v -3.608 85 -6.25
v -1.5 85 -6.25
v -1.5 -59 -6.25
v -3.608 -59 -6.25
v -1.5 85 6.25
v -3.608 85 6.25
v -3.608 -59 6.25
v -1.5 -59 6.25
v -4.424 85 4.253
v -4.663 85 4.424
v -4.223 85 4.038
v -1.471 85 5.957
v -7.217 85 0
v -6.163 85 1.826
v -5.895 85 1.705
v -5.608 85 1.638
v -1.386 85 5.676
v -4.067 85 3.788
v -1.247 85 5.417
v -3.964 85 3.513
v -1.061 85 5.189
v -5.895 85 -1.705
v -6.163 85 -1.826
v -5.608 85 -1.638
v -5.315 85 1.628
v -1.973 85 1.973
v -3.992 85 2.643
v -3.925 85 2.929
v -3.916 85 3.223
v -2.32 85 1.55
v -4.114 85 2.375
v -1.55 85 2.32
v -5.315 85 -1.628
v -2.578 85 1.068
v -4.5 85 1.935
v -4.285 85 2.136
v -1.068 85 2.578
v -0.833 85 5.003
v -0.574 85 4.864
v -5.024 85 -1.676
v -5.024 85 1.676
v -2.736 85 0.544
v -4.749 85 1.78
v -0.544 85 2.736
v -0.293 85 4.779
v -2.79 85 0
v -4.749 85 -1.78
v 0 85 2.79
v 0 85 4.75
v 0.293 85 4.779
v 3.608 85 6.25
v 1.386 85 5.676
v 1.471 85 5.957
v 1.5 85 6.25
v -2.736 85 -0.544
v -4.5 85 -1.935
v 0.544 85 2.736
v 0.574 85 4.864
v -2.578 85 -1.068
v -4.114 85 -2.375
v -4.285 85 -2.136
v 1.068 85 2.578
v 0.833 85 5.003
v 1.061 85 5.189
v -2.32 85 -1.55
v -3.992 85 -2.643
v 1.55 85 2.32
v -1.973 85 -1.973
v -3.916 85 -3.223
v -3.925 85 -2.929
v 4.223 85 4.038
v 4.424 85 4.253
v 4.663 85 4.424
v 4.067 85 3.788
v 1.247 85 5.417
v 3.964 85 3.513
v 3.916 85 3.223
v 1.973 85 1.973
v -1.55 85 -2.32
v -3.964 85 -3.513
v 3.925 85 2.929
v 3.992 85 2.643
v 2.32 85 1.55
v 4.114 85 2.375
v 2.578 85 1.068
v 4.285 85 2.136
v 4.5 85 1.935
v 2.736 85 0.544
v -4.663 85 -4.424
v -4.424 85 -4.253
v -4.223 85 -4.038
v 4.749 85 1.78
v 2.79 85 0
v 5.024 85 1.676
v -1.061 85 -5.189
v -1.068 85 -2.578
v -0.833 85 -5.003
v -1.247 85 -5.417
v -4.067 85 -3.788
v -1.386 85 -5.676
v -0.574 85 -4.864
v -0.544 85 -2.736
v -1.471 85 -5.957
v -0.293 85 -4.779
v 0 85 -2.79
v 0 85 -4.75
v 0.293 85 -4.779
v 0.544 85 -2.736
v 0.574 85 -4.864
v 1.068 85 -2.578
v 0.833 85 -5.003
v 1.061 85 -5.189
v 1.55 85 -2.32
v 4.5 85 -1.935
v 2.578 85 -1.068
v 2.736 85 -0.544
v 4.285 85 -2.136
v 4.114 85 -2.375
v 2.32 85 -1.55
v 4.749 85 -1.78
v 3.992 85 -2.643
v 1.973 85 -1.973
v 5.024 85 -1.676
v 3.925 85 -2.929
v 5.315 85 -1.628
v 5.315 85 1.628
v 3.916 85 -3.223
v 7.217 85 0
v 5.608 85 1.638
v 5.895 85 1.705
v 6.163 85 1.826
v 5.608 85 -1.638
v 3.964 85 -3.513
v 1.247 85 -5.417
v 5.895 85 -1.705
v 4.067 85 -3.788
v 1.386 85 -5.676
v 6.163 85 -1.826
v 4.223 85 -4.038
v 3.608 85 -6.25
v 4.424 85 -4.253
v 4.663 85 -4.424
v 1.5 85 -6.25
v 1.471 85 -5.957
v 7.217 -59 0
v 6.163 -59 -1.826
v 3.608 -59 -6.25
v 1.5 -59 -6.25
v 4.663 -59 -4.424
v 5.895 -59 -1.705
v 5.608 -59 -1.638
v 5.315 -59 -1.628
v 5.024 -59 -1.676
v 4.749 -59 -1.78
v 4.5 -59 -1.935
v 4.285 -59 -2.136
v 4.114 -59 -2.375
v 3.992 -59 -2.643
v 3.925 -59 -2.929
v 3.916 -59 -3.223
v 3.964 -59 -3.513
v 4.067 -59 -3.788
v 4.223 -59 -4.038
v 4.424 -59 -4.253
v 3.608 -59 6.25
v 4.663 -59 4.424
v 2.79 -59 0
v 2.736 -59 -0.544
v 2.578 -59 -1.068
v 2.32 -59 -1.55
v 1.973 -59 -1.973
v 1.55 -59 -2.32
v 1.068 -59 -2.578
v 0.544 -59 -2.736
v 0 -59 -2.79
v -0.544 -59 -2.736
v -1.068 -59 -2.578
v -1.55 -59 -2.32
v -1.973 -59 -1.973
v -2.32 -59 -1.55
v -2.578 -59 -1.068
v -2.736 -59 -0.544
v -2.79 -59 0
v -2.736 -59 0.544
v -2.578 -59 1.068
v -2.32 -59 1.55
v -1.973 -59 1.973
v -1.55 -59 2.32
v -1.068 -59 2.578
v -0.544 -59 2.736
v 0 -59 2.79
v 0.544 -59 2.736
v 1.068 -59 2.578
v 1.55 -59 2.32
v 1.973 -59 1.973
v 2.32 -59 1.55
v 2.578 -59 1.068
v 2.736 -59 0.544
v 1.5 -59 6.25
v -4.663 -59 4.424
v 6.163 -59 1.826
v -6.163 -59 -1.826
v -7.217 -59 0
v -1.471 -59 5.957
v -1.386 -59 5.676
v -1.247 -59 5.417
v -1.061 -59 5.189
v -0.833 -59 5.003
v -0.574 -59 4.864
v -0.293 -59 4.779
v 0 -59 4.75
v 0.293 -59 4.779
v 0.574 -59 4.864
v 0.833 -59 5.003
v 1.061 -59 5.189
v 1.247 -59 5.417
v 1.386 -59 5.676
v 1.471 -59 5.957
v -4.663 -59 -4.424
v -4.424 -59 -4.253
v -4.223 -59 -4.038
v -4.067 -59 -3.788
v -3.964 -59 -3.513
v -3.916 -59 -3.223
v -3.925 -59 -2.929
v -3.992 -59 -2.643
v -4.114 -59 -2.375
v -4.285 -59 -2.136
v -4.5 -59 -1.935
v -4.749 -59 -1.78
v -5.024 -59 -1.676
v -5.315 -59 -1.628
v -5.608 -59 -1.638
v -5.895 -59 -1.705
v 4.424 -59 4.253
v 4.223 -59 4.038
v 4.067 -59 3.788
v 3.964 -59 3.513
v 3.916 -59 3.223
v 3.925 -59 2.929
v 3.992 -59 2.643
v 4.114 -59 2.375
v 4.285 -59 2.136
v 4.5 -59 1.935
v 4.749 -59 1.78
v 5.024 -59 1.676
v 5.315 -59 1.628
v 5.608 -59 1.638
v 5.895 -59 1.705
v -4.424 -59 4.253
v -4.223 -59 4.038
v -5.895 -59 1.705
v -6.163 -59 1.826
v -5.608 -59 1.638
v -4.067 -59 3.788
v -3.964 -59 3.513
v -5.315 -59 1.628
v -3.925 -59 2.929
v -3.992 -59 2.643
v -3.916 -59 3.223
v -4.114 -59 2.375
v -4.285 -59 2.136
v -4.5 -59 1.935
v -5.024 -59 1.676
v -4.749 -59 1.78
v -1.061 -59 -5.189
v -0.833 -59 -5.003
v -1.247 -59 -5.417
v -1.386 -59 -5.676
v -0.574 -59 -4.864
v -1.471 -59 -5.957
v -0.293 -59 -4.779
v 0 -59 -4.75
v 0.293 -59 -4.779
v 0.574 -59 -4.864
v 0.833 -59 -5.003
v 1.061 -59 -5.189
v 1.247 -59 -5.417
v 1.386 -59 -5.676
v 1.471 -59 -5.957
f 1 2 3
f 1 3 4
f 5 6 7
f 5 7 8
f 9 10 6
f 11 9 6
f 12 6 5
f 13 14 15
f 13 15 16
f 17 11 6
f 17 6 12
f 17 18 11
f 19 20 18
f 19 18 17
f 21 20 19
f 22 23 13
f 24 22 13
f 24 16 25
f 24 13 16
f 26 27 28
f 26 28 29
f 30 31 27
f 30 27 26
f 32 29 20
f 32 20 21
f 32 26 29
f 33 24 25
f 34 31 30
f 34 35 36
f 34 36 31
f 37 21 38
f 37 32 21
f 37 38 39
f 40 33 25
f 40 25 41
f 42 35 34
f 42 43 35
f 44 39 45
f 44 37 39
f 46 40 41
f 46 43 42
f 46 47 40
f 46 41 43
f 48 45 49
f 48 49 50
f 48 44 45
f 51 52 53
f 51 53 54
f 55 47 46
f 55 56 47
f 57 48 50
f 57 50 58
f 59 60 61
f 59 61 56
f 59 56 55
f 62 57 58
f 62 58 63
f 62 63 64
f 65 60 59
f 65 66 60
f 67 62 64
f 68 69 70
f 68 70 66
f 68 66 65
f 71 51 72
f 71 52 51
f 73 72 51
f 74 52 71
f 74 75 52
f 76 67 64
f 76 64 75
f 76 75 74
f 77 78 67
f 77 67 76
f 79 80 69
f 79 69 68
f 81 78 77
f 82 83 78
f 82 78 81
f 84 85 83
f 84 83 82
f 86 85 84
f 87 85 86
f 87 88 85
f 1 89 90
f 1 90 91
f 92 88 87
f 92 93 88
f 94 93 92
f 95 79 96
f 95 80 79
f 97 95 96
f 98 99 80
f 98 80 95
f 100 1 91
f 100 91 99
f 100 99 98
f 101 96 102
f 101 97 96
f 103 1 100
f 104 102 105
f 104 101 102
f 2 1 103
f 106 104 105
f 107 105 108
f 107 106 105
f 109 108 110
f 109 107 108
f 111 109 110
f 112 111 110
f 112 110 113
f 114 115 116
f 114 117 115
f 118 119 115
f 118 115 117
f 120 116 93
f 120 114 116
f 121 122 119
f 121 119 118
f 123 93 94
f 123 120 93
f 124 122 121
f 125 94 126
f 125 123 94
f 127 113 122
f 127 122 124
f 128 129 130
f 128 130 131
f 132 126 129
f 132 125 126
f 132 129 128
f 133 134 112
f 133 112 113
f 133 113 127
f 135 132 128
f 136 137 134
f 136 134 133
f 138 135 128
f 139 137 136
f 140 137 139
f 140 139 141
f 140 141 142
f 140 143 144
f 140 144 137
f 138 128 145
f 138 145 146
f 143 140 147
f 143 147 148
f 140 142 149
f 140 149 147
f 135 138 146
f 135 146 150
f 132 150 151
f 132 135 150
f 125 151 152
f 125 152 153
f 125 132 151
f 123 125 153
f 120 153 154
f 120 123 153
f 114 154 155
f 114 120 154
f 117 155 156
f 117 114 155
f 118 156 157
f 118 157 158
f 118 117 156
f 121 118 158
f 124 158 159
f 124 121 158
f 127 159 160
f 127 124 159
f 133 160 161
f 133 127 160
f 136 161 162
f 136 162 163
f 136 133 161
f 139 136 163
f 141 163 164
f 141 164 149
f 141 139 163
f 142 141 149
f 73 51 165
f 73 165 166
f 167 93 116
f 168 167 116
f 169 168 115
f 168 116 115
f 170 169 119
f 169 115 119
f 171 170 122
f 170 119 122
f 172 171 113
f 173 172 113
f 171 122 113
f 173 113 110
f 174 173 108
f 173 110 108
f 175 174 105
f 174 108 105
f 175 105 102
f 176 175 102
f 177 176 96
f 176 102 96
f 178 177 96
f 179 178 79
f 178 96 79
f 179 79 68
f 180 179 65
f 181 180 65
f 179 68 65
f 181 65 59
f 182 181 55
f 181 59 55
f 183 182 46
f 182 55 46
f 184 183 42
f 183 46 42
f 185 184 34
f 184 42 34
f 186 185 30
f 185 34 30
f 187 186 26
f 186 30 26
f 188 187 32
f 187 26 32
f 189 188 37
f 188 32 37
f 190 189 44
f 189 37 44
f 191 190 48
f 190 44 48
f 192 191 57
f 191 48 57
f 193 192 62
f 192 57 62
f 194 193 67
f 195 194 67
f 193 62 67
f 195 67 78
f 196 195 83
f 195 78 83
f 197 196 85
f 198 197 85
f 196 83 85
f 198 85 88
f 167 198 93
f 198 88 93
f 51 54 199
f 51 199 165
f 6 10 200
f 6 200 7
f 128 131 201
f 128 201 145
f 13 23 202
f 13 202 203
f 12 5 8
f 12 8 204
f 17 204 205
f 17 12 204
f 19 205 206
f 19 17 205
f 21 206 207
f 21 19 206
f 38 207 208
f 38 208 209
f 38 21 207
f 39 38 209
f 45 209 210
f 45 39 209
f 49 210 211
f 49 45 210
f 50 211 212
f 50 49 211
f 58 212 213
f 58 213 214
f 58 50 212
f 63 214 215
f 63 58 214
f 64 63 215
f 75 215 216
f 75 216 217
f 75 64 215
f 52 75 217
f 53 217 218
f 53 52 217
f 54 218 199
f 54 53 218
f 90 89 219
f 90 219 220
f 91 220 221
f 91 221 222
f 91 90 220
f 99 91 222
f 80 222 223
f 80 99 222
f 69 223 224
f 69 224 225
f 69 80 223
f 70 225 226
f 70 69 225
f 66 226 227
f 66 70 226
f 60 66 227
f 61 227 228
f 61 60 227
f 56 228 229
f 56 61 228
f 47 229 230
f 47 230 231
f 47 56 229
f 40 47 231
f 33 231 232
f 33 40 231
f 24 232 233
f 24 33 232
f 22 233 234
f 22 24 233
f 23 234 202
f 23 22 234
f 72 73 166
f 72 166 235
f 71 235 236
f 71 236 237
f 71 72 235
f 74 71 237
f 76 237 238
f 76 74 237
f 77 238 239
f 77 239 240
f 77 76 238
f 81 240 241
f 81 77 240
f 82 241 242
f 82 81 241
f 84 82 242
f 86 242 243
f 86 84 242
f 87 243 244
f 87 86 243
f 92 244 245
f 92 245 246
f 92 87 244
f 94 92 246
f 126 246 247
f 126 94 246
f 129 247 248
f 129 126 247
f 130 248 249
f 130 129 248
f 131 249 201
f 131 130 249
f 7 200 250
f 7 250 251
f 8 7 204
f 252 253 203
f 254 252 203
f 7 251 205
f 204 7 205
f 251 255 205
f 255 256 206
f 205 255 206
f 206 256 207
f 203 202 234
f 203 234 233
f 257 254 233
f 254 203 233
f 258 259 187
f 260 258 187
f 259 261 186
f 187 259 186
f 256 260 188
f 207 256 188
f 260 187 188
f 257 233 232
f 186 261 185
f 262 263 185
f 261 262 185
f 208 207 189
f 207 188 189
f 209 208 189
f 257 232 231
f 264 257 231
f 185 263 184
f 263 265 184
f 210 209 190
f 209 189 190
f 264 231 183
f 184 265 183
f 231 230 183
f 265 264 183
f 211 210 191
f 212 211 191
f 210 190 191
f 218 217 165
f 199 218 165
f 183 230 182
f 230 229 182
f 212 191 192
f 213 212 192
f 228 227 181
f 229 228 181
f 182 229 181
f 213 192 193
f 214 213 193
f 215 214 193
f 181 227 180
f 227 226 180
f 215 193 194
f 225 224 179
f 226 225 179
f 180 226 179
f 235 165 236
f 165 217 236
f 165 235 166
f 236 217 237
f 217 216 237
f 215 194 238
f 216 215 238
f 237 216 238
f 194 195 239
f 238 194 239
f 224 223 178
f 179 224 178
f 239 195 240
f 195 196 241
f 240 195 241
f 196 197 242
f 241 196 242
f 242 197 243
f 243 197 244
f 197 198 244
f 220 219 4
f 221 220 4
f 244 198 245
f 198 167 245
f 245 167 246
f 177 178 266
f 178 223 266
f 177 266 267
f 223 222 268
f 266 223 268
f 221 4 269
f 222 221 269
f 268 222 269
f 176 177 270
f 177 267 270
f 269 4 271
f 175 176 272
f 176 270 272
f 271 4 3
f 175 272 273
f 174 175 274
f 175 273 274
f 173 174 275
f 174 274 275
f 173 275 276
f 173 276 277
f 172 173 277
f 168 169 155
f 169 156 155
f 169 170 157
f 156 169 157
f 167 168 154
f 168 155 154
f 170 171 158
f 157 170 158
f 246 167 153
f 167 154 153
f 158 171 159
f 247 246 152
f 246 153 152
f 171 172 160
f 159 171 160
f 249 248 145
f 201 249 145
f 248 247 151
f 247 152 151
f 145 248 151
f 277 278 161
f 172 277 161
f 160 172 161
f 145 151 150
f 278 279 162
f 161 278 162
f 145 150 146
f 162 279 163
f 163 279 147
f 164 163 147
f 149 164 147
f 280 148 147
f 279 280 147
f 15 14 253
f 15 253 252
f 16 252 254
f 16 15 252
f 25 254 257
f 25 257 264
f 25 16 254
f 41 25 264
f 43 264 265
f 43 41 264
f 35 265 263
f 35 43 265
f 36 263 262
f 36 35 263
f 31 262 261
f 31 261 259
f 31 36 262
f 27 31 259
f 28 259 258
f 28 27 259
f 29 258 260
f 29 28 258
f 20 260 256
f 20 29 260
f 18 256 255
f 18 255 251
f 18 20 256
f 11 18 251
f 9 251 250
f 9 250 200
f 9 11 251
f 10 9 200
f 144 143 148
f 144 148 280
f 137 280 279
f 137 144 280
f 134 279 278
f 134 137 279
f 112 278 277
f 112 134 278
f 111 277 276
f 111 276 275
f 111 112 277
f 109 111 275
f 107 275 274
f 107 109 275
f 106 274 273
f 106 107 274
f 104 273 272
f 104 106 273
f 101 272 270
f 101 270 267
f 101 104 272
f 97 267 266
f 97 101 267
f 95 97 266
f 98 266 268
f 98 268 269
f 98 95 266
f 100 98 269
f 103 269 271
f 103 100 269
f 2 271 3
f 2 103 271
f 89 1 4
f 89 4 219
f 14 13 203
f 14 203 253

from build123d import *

# Parameters (mm, degrees)
ESBO_O1_R                = 2.79
RESSALTO_EXTRUS_O1_DEPTH = 144


with BuildPart() as part:
    # Esboço1 → Ressalto-extrusão1 (new body)
    with BuildSketch(Plane(origin=(0, 85, 0), x_dir=(1, 0, 0), z_dir=(0, 1, 0))):
        with BuildLine():
            Line((6.162658774, -1.825961894), (7.216878365, 0))
            Line((7.216878365, 0), (6.162658774, 1.825961894))
            ThreePointArc((6.162658774, 1.825961894), (4.113620668, 2.375), (4.662658774, 4.424038106))
            Line((4.662658774, 4.424038106), (3.608439182, 6.25))
            Line((3.608439182, 6.25), (1.5, 6.25))
            ThreePointArc((1.5, 6.25), (0, 4.75), (-1.5, 6.25))
            Line((-1.5, 6.25), (-3.608439182, 6.25))
            Line((-3.608439182, 6.25), (-4.662658774, 4.424038106))
            ThreePointArc((-4.662658774, 4.424038106), (-4.113620668, 2.375), (-6.162658774, 1.825961894))
            Line((-6.162658774, 1.825961894), (-7.216878365, 0))
            Line((-7.216878365, 0), (-6.162658774, -1.825961894))
            ThreePointArc((-6.162658774, -1.825961894), (-4.113620668, -2.375), (-4.662658774, -4.424038106))
            Line((-4.662658774, -4.424038106), (-3.608439182, -6.25))
            Line((-3.608439182, -6.25), (-1.5, -6.25))
            ThreePointArc((-1.5, -6.25), (0, -4.75), (1.5, -6.25))
            Line((1.5, -6.25), (3.608439182, -6.25))
            Line((3.608439182, -6.25), (4.662658774, -4.424038106))
            ThreePointArc((4.662658774, -4.424038106), (4.113620668, -2.375), (6.162658774, -1.825961894))
        make_face()
        Circle(ESBO_O1_R, mode=Mode.SUBTRACT)
    extrude(amount=-RESSALTO_EXTRUS_O1_DEPTH)


solid = part.part
